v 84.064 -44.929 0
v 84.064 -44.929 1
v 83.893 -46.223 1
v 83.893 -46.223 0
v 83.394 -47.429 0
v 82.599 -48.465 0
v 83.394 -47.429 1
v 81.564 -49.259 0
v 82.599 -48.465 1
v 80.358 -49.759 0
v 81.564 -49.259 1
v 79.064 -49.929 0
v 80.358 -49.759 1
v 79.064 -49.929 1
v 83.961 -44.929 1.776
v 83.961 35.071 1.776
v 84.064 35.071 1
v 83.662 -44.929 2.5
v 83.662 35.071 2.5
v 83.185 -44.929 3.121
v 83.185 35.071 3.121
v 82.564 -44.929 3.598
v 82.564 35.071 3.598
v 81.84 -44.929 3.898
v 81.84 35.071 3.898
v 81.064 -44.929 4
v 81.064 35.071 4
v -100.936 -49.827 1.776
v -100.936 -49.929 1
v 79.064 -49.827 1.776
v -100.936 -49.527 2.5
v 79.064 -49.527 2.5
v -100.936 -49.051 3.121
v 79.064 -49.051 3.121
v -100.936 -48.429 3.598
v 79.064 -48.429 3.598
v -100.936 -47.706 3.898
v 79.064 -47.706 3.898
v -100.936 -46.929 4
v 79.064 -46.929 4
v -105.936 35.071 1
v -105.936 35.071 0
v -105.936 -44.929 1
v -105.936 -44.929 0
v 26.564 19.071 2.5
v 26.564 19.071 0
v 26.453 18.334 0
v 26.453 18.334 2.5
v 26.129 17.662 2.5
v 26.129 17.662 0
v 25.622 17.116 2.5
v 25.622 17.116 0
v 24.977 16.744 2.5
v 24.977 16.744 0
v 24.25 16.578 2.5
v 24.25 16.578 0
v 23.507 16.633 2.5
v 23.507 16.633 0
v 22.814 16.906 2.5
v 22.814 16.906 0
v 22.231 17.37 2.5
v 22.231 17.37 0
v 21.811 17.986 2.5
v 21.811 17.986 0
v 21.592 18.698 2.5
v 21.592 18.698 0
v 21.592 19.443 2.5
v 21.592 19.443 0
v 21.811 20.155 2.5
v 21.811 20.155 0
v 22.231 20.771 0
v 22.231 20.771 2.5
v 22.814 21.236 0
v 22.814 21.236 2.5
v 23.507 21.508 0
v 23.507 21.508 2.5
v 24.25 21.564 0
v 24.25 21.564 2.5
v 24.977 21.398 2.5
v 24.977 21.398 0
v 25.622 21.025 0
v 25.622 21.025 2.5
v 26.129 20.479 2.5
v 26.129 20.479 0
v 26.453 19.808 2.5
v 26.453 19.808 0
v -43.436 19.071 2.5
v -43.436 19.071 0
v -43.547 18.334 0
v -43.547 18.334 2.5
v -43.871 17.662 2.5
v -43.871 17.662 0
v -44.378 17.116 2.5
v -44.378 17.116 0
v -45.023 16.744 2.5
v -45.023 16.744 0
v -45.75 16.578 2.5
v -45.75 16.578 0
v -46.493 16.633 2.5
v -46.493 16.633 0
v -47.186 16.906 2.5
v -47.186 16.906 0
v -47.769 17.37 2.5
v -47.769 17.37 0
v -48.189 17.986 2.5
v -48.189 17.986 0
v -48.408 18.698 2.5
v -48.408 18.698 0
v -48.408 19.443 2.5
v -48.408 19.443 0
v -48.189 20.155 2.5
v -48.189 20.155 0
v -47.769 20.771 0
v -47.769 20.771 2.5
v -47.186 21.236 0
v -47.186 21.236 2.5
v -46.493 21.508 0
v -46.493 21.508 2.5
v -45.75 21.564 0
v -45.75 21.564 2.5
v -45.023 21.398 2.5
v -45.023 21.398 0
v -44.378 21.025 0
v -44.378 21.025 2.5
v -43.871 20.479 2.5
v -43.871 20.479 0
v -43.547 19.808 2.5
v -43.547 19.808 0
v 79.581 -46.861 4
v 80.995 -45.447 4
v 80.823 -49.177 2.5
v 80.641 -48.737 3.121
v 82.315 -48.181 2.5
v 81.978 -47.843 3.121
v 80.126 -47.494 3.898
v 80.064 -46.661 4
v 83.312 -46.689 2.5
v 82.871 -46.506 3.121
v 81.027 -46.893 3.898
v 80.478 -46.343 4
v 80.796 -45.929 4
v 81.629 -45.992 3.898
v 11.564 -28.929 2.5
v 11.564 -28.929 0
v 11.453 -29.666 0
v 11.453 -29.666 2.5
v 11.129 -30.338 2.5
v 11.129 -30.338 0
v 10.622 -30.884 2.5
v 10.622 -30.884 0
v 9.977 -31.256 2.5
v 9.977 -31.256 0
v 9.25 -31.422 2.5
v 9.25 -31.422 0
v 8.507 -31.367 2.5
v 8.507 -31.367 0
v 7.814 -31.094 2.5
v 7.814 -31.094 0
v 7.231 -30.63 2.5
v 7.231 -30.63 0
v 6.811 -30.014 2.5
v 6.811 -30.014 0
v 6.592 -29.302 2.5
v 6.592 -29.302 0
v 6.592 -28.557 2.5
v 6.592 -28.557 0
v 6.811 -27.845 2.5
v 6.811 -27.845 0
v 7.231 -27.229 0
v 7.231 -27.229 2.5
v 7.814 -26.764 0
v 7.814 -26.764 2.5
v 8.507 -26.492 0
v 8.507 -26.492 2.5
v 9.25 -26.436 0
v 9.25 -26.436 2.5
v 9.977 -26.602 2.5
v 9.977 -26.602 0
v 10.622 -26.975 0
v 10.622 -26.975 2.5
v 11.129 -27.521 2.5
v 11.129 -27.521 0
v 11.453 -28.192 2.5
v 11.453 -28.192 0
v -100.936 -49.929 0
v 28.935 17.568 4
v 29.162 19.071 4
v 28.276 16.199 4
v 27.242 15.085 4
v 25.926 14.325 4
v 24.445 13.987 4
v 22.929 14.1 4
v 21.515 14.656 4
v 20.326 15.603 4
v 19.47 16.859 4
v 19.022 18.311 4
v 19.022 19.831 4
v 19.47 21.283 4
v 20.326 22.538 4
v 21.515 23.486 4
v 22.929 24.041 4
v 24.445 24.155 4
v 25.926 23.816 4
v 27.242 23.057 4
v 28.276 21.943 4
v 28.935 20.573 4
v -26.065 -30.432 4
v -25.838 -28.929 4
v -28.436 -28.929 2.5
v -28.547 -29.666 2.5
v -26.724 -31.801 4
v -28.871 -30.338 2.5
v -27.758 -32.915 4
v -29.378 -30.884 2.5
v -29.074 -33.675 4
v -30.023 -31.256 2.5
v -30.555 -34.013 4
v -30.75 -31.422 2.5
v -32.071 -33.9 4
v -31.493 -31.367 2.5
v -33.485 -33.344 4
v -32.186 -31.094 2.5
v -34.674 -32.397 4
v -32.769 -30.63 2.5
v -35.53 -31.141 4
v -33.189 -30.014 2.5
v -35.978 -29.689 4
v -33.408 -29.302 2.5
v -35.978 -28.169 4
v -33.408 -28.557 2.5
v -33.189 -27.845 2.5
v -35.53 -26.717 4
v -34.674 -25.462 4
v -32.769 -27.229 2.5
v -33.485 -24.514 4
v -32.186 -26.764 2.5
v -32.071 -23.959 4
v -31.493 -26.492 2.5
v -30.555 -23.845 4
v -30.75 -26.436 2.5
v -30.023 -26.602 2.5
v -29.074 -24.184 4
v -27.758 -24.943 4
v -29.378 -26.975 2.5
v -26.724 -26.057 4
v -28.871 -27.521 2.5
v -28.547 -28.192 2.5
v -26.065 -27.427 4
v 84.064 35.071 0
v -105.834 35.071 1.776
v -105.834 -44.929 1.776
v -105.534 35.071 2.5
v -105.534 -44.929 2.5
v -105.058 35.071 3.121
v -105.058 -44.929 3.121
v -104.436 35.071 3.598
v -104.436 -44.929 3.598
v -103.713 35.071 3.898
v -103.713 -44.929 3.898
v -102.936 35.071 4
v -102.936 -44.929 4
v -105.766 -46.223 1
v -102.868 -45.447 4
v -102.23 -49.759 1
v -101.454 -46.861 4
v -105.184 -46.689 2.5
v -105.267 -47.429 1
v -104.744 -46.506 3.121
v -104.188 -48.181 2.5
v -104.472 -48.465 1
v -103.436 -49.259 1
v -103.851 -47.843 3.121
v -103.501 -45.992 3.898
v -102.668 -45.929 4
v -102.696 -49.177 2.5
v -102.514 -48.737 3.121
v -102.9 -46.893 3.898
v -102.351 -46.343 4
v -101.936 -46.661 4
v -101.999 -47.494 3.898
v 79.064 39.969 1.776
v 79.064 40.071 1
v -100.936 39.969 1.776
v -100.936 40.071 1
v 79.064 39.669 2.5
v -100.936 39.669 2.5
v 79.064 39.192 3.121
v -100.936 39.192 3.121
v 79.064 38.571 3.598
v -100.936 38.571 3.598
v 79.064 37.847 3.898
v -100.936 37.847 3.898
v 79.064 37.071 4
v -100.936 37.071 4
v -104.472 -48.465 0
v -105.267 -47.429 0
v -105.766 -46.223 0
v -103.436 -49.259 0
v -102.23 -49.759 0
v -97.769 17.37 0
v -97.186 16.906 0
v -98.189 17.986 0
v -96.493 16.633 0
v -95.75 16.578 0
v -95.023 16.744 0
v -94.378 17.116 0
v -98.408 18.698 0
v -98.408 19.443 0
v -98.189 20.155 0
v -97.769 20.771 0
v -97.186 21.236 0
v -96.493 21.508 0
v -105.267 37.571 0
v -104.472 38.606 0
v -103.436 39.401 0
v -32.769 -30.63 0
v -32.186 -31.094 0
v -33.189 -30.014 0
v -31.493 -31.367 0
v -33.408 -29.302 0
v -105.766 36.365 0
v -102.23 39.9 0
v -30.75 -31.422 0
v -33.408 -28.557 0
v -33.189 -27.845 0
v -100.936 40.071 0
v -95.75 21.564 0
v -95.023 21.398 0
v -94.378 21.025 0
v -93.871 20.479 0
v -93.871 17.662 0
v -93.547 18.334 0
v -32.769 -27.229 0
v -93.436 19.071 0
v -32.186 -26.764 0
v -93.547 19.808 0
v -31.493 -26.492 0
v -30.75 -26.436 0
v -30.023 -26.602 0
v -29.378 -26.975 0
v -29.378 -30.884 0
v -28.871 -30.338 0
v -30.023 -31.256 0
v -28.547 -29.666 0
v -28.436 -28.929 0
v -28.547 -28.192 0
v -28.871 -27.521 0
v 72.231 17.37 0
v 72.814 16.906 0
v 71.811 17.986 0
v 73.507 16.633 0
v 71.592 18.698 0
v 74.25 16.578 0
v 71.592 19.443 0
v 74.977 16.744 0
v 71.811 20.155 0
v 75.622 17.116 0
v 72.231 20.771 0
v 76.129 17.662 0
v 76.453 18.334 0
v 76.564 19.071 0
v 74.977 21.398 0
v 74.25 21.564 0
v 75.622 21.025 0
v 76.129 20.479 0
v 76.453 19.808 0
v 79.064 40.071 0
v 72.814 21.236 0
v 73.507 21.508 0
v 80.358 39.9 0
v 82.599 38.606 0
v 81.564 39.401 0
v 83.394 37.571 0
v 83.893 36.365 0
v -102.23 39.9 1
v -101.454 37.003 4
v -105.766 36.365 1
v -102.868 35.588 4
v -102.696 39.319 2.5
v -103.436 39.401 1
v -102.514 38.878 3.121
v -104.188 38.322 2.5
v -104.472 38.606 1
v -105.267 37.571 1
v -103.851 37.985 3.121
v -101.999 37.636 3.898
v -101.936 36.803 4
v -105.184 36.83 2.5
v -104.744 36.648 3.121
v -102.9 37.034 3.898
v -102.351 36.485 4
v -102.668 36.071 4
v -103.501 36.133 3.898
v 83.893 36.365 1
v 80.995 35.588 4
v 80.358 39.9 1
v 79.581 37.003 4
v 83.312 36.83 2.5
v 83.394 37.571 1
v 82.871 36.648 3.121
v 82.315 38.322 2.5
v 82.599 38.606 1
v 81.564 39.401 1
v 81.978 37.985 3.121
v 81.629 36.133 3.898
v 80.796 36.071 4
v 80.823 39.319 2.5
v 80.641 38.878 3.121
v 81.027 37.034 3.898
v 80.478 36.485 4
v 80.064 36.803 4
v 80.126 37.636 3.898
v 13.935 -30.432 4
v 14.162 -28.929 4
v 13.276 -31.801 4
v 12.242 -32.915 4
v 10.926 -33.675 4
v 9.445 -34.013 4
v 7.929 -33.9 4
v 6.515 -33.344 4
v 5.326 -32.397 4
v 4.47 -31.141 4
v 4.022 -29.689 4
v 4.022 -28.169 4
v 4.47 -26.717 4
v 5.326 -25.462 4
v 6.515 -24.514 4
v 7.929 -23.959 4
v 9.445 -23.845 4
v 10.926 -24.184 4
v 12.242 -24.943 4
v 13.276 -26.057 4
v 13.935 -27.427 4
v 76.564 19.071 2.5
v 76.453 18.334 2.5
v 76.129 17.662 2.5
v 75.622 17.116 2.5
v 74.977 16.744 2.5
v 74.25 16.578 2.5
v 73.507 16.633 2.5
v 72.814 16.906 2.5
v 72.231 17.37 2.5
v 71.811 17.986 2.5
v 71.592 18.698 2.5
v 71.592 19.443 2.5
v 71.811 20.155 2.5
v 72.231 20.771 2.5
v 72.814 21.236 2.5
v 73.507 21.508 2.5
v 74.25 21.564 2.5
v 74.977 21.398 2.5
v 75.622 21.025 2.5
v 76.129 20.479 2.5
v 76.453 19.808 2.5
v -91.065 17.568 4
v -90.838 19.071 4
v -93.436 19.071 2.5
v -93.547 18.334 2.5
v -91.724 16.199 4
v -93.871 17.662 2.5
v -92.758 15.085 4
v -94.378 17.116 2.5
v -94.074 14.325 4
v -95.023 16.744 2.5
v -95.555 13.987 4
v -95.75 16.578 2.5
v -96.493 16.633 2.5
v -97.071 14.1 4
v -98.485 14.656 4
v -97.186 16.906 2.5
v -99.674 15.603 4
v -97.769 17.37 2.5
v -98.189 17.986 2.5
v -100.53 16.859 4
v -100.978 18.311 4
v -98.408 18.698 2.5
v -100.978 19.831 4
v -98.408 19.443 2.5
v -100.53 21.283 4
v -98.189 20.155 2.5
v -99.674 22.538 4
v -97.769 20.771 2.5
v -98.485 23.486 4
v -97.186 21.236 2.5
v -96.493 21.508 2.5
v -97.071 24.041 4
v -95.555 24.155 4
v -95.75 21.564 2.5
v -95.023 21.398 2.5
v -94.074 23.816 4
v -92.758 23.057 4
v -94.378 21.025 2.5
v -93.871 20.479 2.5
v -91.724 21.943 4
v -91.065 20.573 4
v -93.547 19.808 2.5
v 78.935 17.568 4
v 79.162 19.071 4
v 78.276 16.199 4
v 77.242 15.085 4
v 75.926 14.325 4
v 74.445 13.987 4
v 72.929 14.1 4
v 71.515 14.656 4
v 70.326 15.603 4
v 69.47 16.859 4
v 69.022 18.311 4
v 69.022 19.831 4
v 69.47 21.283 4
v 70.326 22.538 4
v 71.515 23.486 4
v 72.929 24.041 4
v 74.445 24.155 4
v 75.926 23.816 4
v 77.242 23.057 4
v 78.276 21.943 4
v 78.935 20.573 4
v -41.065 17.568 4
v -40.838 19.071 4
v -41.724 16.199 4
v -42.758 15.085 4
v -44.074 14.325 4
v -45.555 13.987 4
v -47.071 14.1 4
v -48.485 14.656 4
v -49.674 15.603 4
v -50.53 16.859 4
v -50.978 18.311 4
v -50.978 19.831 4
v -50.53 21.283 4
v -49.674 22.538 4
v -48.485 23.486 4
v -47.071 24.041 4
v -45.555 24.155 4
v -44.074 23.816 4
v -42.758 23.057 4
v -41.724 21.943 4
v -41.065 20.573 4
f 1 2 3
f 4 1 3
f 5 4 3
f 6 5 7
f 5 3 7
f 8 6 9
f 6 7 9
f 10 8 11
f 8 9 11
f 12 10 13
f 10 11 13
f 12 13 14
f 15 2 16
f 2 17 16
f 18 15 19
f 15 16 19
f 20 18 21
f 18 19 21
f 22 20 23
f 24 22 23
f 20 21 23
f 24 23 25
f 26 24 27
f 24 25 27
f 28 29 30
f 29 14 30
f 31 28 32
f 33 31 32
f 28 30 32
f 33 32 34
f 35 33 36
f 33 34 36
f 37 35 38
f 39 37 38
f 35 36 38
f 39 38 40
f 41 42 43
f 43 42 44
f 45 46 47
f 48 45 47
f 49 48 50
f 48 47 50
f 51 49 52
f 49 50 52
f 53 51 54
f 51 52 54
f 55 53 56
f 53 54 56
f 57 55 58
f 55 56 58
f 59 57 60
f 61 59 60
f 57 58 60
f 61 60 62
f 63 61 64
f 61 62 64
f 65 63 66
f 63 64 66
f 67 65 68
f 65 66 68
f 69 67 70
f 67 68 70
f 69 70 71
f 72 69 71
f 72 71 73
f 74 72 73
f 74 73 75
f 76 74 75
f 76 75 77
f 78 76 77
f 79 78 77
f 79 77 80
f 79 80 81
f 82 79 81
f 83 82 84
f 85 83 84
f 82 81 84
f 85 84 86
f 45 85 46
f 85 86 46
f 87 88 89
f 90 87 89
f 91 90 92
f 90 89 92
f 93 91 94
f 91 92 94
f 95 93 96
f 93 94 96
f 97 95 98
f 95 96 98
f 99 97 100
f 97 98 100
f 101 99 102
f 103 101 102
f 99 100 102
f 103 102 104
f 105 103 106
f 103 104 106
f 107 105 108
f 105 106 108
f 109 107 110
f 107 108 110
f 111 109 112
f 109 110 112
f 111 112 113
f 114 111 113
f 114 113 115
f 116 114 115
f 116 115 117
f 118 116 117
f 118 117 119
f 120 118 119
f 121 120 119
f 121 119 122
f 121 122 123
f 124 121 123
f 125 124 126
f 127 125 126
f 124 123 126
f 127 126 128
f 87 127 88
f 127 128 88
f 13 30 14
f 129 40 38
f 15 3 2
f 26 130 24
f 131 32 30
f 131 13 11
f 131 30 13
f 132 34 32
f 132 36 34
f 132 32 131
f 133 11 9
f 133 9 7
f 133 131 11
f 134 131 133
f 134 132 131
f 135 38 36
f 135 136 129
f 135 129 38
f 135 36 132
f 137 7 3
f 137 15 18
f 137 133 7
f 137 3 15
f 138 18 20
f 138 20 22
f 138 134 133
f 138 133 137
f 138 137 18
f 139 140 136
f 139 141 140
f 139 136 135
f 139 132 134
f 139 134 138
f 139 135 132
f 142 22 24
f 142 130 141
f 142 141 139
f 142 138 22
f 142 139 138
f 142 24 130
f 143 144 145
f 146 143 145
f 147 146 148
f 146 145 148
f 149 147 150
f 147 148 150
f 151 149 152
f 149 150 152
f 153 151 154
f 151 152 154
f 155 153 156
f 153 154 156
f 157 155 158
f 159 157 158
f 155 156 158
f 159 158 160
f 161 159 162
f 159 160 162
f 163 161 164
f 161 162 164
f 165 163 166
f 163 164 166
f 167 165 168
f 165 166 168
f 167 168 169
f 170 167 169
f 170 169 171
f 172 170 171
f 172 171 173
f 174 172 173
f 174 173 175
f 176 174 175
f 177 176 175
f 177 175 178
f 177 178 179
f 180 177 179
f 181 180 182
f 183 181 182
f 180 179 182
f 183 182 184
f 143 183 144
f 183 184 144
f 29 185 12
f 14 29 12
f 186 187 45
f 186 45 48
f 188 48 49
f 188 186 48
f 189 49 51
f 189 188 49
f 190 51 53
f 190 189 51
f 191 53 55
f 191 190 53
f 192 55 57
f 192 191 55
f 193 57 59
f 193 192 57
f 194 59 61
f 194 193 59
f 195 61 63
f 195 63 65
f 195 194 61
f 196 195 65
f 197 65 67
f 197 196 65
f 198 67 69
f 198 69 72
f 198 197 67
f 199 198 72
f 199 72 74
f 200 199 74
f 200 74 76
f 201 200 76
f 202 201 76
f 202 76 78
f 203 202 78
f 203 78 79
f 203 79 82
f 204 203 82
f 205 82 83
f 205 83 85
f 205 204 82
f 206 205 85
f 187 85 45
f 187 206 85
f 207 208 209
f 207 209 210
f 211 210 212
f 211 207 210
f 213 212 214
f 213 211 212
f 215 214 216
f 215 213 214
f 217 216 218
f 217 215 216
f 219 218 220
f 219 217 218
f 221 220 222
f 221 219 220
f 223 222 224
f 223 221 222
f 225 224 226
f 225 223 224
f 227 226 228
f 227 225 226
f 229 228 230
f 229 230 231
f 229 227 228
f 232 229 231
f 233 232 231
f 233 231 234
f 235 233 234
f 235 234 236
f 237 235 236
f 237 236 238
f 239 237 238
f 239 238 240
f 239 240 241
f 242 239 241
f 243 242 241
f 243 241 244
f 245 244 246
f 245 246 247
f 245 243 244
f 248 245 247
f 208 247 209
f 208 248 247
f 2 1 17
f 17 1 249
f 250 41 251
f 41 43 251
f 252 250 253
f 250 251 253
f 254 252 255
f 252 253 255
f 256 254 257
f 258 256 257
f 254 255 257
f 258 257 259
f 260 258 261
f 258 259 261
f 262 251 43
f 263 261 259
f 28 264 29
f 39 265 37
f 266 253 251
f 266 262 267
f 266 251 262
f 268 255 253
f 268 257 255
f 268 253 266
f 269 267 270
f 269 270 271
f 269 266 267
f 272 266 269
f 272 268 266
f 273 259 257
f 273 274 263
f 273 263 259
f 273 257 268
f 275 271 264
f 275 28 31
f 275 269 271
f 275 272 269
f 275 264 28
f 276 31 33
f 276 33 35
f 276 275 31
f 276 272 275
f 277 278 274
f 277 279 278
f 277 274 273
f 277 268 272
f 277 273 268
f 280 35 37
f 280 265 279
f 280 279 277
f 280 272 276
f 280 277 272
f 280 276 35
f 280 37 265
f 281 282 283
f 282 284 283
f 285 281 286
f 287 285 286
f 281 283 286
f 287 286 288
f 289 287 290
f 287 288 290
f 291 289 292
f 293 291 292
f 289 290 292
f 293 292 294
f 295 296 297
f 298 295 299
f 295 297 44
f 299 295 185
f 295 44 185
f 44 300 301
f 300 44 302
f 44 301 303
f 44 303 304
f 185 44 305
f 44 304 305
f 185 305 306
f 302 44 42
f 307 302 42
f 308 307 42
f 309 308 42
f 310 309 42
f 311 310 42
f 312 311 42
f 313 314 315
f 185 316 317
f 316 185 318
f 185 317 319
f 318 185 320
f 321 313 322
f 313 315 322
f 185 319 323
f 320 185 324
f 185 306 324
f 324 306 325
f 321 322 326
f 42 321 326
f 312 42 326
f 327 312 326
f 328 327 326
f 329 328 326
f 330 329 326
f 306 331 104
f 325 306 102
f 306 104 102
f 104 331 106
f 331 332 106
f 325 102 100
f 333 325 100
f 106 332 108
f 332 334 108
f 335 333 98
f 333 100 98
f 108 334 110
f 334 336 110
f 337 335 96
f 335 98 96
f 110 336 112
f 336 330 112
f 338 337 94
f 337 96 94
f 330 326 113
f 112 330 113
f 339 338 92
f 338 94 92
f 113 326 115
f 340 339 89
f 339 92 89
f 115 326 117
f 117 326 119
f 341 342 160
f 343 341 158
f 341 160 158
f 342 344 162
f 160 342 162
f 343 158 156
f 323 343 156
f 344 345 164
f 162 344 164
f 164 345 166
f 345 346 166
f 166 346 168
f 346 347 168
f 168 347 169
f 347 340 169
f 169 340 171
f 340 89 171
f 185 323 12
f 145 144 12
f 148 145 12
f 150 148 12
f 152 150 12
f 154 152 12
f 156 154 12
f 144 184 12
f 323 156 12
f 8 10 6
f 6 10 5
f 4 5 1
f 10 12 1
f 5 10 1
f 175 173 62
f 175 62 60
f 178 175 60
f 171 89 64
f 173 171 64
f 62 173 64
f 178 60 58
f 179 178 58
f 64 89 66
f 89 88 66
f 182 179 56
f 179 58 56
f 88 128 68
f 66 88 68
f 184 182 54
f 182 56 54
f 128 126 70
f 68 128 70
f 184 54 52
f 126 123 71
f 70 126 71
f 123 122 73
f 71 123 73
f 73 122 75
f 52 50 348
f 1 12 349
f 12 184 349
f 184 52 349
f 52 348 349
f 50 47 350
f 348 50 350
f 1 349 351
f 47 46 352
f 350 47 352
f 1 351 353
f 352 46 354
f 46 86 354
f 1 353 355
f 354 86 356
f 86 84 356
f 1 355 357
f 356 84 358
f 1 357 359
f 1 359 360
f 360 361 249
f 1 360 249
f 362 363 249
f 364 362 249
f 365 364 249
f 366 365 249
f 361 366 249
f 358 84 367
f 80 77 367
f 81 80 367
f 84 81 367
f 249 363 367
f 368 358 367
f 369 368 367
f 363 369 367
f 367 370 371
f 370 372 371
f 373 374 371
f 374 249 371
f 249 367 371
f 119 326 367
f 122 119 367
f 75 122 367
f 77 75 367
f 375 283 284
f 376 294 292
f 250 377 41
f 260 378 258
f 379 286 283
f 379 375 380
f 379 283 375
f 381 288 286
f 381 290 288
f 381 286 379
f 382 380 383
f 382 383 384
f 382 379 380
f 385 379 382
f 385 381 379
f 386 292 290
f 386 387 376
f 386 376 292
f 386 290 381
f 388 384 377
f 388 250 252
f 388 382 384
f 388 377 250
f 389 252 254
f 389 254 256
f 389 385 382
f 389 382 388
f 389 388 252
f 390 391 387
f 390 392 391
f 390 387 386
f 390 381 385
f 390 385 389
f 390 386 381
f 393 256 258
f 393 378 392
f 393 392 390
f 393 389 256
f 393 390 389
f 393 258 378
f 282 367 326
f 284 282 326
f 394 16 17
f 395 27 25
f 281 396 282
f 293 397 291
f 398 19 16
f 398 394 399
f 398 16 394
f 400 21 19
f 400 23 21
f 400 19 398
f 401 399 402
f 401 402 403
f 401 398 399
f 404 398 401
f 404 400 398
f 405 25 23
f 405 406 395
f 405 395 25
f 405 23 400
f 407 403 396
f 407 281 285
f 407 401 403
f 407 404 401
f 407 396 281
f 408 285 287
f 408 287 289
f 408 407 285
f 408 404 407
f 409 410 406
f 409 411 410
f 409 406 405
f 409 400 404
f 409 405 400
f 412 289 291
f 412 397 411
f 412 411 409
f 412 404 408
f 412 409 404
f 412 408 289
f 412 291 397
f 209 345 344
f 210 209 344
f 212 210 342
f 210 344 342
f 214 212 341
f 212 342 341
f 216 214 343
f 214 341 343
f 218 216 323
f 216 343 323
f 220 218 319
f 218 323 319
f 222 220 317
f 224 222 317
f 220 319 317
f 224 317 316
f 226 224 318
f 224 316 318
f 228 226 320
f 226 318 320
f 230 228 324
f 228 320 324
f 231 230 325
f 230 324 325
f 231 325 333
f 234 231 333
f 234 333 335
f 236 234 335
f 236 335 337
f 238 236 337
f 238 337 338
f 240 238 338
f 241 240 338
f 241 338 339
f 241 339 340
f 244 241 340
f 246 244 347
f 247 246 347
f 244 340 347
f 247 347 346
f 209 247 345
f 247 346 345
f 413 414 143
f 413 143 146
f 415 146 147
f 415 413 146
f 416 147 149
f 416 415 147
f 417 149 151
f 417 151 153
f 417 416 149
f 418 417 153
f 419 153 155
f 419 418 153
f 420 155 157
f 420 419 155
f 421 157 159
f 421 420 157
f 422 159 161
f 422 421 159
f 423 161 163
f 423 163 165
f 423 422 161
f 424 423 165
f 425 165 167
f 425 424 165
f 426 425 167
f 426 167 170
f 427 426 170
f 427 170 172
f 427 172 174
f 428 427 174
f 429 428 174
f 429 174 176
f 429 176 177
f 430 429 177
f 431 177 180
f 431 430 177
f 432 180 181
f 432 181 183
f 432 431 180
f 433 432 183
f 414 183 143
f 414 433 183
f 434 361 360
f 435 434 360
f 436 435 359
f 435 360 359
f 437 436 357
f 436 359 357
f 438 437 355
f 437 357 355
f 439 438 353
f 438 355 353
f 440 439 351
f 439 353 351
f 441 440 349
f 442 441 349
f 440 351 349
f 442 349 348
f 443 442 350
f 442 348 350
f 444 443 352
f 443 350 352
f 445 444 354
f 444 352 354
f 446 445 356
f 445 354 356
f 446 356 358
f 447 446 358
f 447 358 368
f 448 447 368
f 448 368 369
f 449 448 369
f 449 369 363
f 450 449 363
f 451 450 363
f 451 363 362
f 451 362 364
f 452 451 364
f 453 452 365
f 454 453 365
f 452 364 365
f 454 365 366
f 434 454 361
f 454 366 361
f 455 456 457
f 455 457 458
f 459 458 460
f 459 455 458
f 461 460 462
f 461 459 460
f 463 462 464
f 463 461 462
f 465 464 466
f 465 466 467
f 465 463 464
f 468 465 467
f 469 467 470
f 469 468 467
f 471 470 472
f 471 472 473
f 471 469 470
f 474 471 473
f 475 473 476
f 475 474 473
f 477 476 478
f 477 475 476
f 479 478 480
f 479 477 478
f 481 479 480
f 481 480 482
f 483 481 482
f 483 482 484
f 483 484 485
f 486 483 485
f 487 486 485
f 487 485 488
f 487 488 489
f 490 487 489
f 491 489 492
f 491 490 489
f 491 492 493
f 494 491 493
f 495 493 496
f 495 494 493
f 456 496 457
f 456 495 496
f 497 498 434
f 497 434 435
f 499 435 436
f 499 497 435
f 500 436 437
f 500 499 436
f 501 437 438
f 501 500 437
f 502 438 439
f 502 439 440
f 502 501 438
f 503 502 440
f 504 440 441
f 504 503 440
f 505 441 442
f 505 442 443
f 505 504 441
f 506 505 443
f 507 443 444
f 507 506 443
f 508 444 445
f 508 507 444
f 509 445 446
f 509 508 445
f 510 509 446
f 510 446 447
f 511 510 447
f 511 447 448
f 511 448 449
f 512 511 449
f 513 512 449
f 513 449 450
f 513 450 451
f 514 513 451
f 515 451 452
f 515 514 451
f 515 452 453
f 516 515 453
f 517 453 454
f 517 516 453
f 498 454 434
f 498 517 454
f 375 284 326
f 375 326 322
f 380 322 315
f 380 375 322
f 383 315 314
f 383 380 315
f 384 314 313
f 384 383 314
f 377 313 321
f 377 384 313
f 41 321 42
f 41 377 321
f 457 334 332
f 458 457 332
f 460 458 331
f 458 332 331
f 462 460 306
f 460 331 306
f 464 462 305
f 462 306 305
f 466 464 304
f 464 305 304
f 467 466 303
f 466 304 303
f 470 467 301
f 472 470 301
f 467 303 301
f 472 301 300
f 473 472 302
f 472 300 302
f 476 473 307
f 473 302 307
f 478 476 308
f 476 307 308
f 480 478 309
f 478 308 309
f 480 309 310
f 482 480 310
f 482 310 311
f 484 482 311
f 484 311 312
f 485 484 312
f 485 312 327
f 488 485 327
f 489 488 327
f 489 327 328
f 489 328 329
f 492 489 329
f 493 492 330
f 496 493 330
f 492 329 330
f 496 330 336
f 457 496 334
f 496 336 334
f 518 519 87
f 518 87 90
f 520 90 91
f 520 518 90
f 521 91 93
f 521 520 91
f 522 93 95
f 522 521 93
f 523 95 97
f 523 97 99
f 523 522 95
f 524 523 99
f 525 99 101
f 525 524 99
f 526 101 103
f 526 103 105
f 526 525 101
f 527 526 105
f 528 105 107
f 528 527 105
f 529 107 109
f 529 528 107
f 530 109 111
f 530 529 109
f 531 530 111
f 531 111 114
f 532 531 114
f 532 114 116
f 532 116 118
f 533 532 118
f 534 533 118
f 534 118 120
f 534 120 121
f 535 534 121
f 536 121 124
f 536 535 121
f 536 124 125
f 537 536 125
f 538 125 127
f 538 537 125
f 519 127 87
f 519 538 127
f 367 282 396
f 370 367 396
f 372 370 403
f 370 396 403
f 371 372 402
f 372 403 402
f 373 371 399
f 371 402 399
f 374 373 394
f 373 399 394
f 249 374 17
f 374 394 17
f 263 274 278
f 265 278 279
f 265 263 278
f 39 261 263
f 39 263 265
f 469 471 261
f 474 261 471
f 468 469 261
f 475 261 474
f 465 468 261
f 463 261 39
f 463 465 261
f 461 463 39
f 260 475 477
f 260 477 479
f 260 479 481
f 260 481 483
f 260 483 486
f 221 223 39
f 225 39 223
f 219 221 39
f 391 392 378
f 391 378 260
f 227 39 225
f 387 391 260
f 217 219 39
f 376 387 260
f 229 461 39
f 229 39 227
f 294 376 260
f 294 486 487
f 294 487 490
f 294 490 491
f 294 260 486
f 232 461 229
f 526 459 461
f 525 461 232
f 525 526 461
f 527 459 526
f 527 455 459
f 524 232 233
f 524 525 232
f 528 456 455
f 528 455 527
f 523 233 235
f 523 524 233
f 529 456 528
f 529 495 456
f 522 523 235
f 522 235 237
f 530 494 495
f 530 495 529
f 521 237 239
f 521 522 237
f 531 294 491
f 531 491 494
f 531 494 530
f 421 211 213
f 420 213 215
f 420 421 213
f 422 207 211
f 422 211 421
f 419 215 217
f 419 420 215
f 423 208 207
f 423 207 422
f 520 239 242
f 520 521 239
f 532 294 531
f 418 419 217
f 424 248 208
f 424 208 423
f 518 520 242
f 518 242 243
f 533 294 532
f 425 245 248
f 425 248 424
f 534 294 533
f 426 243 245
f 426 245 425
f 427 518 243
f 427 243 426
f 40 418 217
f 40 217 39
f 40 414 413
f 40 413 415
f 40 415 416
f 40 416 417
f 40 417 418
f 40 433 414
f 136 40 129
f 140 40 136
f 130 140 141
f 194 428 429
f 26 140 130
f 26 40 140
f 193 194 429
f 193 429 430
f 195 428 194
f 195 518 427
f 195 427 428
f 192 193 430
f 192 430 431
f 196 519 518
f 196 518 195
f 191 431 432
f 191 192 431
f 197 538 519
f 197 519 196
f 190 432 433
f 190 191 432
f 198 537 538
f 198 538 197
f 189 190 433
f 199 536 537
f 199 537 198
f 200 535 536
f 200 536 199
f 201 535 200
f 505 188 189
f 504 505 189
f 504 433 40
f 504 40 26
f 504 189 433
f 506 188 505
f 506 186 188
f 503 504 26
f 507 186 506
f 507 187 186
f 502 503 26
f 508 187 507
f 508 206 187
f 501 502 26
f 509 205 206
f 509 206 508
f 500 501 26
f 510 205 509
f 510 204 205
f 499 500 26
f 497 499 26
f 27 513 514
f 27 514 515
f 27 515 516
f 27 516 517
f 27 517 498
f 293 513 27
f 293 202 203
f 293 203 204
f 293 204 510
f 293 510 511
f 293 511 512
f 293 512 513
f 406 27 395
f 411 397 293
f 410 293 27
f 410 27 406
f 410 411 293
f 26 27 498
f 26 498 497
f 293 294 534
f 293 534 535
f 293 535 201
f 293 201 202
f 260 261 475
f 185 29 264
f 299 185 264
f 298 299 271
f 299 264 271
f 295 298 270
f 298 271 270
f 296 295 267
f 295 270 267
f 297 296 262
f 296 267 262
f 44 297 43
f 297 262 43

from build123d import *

# Parameters (mm, degrees)
F1_DEPTH   = 4
F2_R       = 5
F3_R       = 5
F4_R       = 5
F5_R       = 5
F6_R       = 3
F7_SIZE2   = 2.5980762114
F7_SIZE    = 1.5
F7_2_SIZE2 = 2.5980762114
F7_2_SIZE  = 1.5
F7_3_SIZE2 = 2.5980762114
F7_3_SIZE  = 1.5
F7_4_SIZE2 = 2.5980762114
F7_4_SIZE  = 1.5
F7_5_SIZE2 = 2.5980762114
F7_5_SIZE  = 1.5
F7_6_SIZE2 = 2.5980762114
F7_6_SIZE  = 1.5


with BuildPart() as f1:
    # F0 (on Top) → F1 (new body)
    with BuildSketch(Plane.XY):
        with BuildLine():
            Line((84.0636147559, 40.0707364747), (-105.9363852441, 40.0707364747))
            Line((-105.9363852441, 40.0707364747), (-105.9363852441, 19.0707364747))
            Line((-105.9363852441, 19.0707364747), (-98.4363852441, 19.0707364747))
            ThreePointArc((-98.4363852441, 19.0707364747), (-95.9363852441, 21.5707364747), (-93.4363852441, 19.0707364747))
            Line((-93.4363852441, 19.0707364747), (-48.4363852441, 19.0707364747))
            ThreePointArc((-48.4363852441, 19.0707364747), (-45.9363852441, 21.5707364747), (-43.4363852441, 19.0707364747))
            Line((-43.4363852441, 19.0707364747), (21.5636147559, 19.0707364747))
            ThreePointArc((21.5636147559, 19.0707364747), (24.0636147559, 21.5707364747), (26.5636147559, 19.0707364747))
            Line((26.5636147559, 19.0707364747), (71.5636147559, 19.0707364747))
            ThreePointArc((71.5636147559, 19.0707364747), (74.0636147559, 21.5707364747), (76.5636147559, 19.0707364747))
            Line((76.5636147559, 19.0707364747), (84.0636147559, 19.0707364747))
            Line((84.0636147559, 19.0707364747), (84.0636147559, 40.0707364747))
        make_face()
        with BuildLine():
            Line((-98.4363852441, 19.0707364747), (-105.9363852441, 19.0707364747))
            Line((-105.9363852441, 19.0707364747), (-105.9363852441, -28.9292635253))
            Line((-105.9363852441, -28.9292635253), (-33.4363852441, -28.9292635253))
            ThreePointArc((-33.4363852441, -28.9292635253), (-30.9363852441, -26.4292635253), (-28.4363852441, -28.9292635253))
            Line((-28.4363852441, -28.9292635253), (6.5636147559, -28.9292635253))
            ThreePointArc((6.5636147559, -28.9292635253), (9.0636147559, -26.4292635253), (11.5636147559, -28.9292635253))
            Line((11.5636147559, -28.9292635253), (84.0636147559, -28.9292635253))
            Line((84.0636147559, -28.9292635253), (84.0636147559, 19.0707364747))
            Line((84.0636147559, 19.0707364747), (76.5636147559, 19.0707364747))
            ThreePointArc((76.5636147559, 19.0707364747), (74.0636147559, 16.5707364747), (71.5636147559, 19.0707364747))
            Line((71.5636147559, 19.0707364747), (26.5636147559, 19.0707364747))
            ThreePointArc((26.5636147559, 19.0707364747), (24.0636147559, 16.5707364747), (21.5636147559, 19.0707364747))
            Line((21.5636147559, 19.0707364747), (-43.4363852441, 19.0707364747))
            ThreePointArc((-43.4363852441, 19.0707364747), (-45.9363852441, 16.5707364747), (-48.4363852441, 19.0707364747))
            Line((-48.4363852441, 19.0707364747), (-93.4363852441, 19.0707364747))
            ThreePointArc((-93.4363852441, 19.0707364747), (-95.9363852441, 16.5707364747), (-98.4363852441, 19.0707364747))
        make_face()
        with BuildLine():
            Line((-33.4363852441, -28.9292635253), (-105.9363852441, -28.9292635253))
            Line((-105.9363852441, -28.9292635253), (-105.9363852441, -49.9292635253))
            Line((-105.9363852441, -49.9292635253), (84.0636147559, -49.9292635253))
            Line((84.0636147559, -49.9292635253), (84.0636147559, -28.9292635253))
            Line((84.0636147559, -28.9292635253), (11.5636147559, -28.9292635253))
            ThreePointArc((11.5636147559, -28.9292635253), (9.0636147559, -31.4292635253), (6.5636147559, -28.9292635253))
            Line((6.5636147559, -28.9292635253), (-28.4363852441, -28.9292635253))
            ThreePointArc((-28.4363852441, -28.9292635253), (-30.9363852441, -31.4292635253), (-33.4363852441, -28.9292635253))
        make_face()
    extrude(amount=F1_DEPTH)

    # F2
    f2_edges = [f1.edges().sort_by_distance(p)[0] for p in [
        (-105.936385, 40.070736, 2),
    ]]
    fillet(f2_edges, radius=F2_R)

    # F3
    f3_edges = [f1.edges().sort_by_distance(p)[0] for p in [
        (84.063615, 40.070736, 2),
    ]]
    fillet(f3_edges, radius=F3_R)

    # F4
    f4_edges = [f1.edges().sort_by_distance(p)[0] for p in [
        (84.063615, -49.929264, 2),
    ]]
    fillet(f4_edges, radius=F4_R)

    # F5
    f5_edges = [f1.edges().sort_by_distance(p)[0] for p in [
        (-105.936385, -49.929264, 2),
    ]]
    fillet(f5_edges, radius=F5_R)

    # F6
    f6_edges = [f1.edges().sort_by_distance(p)[0] for p in [
        (-10.936385, -49.929264, 4),
    ]]
    fillet(f6_edges, radius=F6_R)

    # F7
    f7_edges = [f1.edges().sort_by_distance(p)[0] for p in [
        (-98.436385, 19.070736, 4),
    ]]
    f7_side = f1.faces().sort_by_distance((-98.436385, 19.070736, 2))[0]
    chamfer(f7_edges, length=F7_SIZE, length2=F7_SIZE2, reference=f7_side)

    # F7#2
    f7_2_edges = [f1.edges().sort_by_distance(p)[0] for p in [
        (-48.436385, 19.070736, 4),
    ]]
    f7_2_side = f1.faces().sort_by_distance((-48.436385, 19.070736, 2))[0]
    chamfer(f7_2_edges, length=F7_2_SIZE, length2=F7_2_SIZE2, reference=f7_2_side)

    # F7#3
    f7_3_edges = [f1.edges().sort_by_distance(p)[0] for p in [
        (21.563615, 19.070736, 4),
    ]]
    f7_3_side = f1.faces().sort_by_distance((21.563615, 19.070736, 2))[0]
    chamfer(f7_3_edges, length=F7_3_SIZE, length2=F7_3_SIZE2, reference=f7_3_side)

    # F7#4
    f7_4_edges = [f1.edges().sort_by_distance(p)[0] for p in [
        (71.563615, 19.070736, 4),
    ]]
    f7_4_side = f1.faces().sort_by_distance((71.563615, 19.070736, 2))[0]
    chamfer(f7_4_edges, length=F7_4_SIZE, length2=F7_4_SIZE2, reference=f7_4_side)

    # F7#5
    f7_5_edges = [f1.edges().sort_by_distance(p)[0] for p in [
        (6.563615, -28.929264, 4),
    ]]
    f7_5_side = f1.faces().sort_by_distance((6.563615, -28.929264, 2))[0]
    chamfer(f7_5_edges, length=F7_5_SIZE, length2=F7_5_SIZE2, reference=f7_5_side)

    # F7#6
    f7_6_edges = [f1.edges().sort_by_distance(p)[0] for p in [
        (-33.436385, -28.929264, 4),
    ]]
    f7_6_side = f1.faces().sort_by_distance((-33.436385, -28.929264, 2))[0]
    chamfer(f7_6_edges, length=F7_6_SIZE, length2=F7_6_SIZE2, reference=f7_6_side)


solid = f1.part
